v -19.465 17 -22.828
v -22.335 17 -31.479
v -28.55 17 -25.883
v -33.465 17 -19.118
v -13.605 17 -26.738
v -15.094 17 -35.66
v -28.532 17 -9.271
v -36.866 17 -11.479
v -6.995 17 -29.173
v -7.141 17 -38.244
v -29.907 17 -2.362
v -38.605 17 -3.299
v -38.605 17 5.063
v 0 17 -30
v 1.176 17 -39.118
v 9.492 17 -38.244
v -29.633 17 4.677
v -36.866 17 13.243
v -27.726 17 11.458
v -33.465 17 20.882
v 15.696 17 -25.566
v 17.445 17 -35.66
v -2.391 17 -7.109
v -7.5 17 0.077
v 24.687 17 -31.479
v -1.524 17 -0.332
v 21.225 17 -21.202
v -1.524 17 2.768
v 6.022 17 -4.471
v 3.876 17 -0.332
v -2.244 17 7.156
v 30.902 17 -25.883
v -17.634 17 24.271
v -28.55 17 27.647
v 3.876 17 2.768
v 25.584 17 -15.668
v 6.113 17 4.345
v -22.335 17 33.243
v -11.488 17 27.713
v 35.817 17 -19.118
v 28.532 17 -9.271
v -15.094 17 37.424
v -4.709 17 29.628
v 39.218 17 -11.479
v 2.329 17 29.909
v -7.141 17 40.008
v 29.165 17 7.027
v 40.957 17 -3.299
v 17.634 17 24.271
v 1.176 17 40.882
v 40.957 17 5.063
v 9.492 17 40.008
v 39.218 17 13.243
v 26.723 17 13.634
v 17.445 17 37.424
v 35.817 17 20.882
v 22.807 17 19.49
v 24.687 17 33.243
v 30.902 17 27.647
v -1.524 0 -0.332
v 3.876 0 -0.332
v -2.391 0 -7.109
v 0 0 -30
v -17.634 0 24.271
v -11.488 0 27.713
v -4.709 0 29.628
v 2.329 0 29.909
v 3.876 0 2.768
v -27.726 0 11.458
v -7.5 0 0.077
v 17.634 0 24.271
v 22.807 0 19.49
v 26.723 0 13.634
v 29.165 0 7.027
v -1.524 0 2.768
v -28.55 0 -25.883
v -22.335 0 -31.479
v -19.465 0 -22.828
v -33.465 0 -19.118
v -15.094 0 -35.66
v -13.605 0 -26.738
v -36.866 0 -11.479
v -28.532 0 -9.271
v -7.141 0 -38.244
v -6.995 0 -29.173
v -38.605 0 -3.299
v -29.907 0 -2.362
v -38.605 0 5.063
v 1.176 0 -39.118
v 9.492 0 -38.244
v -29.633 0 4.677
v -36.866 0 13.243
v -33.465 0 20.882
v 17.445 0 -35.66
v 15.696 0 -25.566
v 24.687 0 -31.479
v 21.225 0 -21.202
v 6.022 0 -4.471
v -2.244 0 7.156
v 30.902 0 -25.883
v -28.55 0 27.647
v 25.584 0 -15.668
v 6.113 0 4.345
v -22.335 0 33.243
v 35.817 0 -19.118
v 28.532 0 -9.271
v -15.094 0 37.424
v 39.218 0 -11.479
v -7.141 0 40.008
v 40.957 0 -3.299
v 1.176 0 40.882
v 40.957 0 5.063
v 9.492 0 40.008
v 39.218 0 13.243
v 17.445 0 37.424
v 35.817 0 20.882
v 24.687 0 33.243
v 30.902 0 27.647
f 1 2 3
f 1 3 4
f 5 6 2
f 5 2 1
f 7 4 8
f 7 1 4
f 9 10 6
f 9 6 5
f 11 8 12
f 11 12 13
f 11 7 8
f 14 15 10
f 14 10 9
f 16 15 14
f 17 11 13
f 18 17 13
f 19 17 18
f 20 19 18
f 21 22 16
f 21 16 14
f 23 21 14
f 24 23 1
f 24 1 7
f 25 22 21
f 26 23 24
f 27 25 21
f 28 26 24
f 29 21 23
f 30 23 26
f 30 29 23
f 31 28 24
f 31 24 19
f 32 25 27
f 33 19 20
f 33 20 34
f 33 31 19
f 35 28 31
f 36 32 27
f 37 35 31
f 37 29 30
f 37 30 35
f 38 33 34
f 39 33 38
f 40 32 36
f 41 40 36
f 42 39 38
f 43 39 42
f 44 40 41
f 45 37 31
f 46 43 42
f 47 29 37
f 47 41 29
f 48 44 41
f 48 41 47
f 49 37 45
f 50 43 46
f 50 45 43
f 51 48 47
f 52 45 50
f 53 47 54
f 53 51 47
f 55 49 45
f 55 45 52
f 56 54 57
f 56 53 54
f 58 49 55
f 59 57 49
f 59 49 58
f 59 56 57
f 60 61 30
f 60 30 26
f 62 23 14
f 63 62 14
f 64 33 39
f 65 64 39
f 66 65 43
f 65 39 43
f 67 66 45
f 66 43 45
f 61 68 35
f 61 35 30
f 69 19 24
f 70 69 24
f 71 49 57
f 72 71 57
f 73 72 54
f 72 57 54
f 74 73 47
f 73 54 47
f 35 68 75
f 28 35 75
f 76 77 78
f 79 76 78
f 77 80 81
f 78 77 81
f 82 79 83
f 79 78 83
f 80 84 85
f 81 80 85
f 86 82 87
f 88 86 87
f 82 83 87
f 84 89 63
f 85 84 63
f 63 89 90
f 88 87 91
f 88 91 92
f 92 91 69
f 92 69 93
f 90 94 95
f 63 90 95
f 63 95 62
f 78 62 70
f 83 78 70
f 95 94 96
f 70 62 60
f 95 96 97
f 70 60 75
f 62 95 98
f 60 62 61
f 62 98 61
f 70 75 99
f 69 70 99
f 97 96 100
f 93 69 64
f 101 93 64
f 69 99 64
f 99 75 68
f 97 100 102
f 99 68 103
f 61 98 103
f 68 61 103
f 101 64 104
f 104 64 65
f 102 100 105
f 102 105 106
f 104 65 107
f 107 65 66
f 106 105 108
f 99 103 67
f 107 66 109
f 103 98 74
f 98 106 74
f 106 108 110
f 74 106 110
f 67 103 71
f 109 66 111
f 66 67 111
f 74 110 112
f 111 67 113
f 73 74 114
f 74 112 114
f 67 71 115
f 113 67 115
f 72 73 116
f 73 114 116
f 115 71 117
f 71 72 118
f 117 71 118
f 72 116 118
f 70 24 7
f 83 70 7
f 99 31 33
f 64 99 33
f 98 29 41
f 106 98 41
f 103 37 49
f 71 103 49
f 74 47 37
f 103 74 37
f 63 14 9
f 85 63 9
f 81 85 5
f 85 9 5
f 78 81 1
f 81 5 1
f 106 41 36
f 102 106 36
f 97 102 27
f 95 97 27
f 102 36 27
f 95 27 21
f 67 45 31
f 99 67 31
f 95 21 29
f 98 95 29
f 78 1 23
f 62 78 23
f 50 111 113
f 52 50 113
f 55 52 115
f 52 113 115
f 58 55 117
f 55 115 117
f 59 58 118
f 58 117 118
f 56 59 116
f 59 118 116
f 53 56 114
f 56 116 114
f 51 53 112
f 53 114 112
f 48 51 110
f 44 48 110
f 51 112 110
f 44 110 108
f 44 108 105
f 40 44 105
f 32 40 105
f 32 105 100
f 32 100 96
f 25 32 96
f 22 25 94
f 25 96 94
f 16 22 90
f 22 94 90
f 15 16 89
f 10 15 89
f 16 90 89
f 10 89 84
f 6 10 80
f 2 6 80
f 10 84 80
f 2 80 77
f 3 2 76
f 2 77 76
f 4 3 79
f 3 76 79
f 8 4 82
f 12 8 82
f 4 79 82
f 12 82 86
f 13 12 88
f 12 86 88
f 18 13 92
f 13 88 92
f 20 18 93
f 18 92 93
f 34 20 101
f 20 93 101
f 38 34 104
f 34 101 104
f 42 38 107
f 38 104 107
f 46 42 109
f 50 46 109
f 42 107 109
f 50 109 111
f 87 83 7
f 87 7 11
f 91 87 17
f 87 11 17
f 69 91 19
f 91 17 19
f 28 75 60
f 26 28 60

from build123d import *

# Parameters (mm, degrees)
ESQUISSE1_R             = 40
BOSS_EXTRU_1_DEPTH      = 17
ENL_V_MAT_EXTRU_1_DEPTH = 17
ESQUISSE7_W             = 5.4
ESQUISSE7_H             = 3.1
ENL_V_MAT_EXTRU_3_DEPTH = 20


with BuildPart() as part:
    # Esquisse1 → Boss.-Extru.1 (new body)
    with BuildSketch(Plane(origin=(0, 0, 0), x_dir=(1, 0, 0), z_dir=(0, 1, 0))):
        with Locations(Location((1.175962064, -0.881971548, 0), (0, 0, 270))):
            Circle(ESQUISSE1_R)
    extrude(amount=BOSS_EXTRU_1_DEPTH)

    # Esquisse4 → Enlèv. mat.-Extru.1 (cut)
    with BuildSketch(Plane(origin=(0, 17, 0), x_dir=(1, 0, 0), z_dir=(0, 1, 0))):
        with BuildLine():
            Line((-19.464562445, 22.82828966), (-2.391160411, 7.108611108))
            Line((-2.391160411, 7.108611108), (0, 30))
            ThreePointArc((0, 30), (-10.371868448, 28.150032769), (-19.464562445, 22.82828966))
        make_face()
        with BuildLine():
            ThreePointArc((28.531695489, 9.270509831), (23.567188485, 18.563071591), (15.696113054, 25.566228408))
            Line((15.696113054, 25.566228408), (6.021781713, 4.470810329))
            Line((6.021781713, 4.470810329), (28.531695489, 9.270509831))
        make_face()
        with BuildLine():
            ThreePointArc((17.633557569, -24.270509831), (24.937191951, -16.67742359), (29.165293804, -7.02749154))
            Line((29.165293804, -7.02749154), (6.112826182, -4.345498368))
            Line((6.112826182, -4.345498368), (17.633557569, -24.270509831))
        make_face()
        with BuildLine():
            Line((-2.243847365, -7.156476018), (-17.633557569, -24.270509831))
            ThreePointArc((-17.633557569, -24.270509831), (-8.155156276, -28.870286215), (2.329029809, -29.909457035))
            Line((2.329029809, -29.909457035), (-2.243847365, -7.156476018))
        make_face()
        with BuildLine():
            Line((-7.49960012, -0.077447051), (-28.531695489, 9.270509831))
            ThreePointArc((-28.531695489, 9.270509831), (-29.977355713, -1.165394555), (-27.725874221, -11.457569493))
            Line((-27.725874221, -11.457569493), (-7.49960012, -0.077447051))
        make_face()
    extrude(amount=-ENL_V_MAT_EXTRU_1_DEPTH, mode=Mode.SUBTRACT)

    # Esquisse7 → Enlèv. mat.-Extru.3 (cut)
    with BuildSketch(Plane(origin=(0, 0, 0), x_dir=(-1, 0, 0), z_dir=(0, -1, 0))):
        with Locations((-1.176467364, -1.217534794)):
            Rectangle(ESQUISSE7_W, ESQUISSE7_H)
    extrude(amount=-ENL_V_MAT_EXTRU_3_DEPTH, mode=Mode.SUBTRACT)


solid = part.part
